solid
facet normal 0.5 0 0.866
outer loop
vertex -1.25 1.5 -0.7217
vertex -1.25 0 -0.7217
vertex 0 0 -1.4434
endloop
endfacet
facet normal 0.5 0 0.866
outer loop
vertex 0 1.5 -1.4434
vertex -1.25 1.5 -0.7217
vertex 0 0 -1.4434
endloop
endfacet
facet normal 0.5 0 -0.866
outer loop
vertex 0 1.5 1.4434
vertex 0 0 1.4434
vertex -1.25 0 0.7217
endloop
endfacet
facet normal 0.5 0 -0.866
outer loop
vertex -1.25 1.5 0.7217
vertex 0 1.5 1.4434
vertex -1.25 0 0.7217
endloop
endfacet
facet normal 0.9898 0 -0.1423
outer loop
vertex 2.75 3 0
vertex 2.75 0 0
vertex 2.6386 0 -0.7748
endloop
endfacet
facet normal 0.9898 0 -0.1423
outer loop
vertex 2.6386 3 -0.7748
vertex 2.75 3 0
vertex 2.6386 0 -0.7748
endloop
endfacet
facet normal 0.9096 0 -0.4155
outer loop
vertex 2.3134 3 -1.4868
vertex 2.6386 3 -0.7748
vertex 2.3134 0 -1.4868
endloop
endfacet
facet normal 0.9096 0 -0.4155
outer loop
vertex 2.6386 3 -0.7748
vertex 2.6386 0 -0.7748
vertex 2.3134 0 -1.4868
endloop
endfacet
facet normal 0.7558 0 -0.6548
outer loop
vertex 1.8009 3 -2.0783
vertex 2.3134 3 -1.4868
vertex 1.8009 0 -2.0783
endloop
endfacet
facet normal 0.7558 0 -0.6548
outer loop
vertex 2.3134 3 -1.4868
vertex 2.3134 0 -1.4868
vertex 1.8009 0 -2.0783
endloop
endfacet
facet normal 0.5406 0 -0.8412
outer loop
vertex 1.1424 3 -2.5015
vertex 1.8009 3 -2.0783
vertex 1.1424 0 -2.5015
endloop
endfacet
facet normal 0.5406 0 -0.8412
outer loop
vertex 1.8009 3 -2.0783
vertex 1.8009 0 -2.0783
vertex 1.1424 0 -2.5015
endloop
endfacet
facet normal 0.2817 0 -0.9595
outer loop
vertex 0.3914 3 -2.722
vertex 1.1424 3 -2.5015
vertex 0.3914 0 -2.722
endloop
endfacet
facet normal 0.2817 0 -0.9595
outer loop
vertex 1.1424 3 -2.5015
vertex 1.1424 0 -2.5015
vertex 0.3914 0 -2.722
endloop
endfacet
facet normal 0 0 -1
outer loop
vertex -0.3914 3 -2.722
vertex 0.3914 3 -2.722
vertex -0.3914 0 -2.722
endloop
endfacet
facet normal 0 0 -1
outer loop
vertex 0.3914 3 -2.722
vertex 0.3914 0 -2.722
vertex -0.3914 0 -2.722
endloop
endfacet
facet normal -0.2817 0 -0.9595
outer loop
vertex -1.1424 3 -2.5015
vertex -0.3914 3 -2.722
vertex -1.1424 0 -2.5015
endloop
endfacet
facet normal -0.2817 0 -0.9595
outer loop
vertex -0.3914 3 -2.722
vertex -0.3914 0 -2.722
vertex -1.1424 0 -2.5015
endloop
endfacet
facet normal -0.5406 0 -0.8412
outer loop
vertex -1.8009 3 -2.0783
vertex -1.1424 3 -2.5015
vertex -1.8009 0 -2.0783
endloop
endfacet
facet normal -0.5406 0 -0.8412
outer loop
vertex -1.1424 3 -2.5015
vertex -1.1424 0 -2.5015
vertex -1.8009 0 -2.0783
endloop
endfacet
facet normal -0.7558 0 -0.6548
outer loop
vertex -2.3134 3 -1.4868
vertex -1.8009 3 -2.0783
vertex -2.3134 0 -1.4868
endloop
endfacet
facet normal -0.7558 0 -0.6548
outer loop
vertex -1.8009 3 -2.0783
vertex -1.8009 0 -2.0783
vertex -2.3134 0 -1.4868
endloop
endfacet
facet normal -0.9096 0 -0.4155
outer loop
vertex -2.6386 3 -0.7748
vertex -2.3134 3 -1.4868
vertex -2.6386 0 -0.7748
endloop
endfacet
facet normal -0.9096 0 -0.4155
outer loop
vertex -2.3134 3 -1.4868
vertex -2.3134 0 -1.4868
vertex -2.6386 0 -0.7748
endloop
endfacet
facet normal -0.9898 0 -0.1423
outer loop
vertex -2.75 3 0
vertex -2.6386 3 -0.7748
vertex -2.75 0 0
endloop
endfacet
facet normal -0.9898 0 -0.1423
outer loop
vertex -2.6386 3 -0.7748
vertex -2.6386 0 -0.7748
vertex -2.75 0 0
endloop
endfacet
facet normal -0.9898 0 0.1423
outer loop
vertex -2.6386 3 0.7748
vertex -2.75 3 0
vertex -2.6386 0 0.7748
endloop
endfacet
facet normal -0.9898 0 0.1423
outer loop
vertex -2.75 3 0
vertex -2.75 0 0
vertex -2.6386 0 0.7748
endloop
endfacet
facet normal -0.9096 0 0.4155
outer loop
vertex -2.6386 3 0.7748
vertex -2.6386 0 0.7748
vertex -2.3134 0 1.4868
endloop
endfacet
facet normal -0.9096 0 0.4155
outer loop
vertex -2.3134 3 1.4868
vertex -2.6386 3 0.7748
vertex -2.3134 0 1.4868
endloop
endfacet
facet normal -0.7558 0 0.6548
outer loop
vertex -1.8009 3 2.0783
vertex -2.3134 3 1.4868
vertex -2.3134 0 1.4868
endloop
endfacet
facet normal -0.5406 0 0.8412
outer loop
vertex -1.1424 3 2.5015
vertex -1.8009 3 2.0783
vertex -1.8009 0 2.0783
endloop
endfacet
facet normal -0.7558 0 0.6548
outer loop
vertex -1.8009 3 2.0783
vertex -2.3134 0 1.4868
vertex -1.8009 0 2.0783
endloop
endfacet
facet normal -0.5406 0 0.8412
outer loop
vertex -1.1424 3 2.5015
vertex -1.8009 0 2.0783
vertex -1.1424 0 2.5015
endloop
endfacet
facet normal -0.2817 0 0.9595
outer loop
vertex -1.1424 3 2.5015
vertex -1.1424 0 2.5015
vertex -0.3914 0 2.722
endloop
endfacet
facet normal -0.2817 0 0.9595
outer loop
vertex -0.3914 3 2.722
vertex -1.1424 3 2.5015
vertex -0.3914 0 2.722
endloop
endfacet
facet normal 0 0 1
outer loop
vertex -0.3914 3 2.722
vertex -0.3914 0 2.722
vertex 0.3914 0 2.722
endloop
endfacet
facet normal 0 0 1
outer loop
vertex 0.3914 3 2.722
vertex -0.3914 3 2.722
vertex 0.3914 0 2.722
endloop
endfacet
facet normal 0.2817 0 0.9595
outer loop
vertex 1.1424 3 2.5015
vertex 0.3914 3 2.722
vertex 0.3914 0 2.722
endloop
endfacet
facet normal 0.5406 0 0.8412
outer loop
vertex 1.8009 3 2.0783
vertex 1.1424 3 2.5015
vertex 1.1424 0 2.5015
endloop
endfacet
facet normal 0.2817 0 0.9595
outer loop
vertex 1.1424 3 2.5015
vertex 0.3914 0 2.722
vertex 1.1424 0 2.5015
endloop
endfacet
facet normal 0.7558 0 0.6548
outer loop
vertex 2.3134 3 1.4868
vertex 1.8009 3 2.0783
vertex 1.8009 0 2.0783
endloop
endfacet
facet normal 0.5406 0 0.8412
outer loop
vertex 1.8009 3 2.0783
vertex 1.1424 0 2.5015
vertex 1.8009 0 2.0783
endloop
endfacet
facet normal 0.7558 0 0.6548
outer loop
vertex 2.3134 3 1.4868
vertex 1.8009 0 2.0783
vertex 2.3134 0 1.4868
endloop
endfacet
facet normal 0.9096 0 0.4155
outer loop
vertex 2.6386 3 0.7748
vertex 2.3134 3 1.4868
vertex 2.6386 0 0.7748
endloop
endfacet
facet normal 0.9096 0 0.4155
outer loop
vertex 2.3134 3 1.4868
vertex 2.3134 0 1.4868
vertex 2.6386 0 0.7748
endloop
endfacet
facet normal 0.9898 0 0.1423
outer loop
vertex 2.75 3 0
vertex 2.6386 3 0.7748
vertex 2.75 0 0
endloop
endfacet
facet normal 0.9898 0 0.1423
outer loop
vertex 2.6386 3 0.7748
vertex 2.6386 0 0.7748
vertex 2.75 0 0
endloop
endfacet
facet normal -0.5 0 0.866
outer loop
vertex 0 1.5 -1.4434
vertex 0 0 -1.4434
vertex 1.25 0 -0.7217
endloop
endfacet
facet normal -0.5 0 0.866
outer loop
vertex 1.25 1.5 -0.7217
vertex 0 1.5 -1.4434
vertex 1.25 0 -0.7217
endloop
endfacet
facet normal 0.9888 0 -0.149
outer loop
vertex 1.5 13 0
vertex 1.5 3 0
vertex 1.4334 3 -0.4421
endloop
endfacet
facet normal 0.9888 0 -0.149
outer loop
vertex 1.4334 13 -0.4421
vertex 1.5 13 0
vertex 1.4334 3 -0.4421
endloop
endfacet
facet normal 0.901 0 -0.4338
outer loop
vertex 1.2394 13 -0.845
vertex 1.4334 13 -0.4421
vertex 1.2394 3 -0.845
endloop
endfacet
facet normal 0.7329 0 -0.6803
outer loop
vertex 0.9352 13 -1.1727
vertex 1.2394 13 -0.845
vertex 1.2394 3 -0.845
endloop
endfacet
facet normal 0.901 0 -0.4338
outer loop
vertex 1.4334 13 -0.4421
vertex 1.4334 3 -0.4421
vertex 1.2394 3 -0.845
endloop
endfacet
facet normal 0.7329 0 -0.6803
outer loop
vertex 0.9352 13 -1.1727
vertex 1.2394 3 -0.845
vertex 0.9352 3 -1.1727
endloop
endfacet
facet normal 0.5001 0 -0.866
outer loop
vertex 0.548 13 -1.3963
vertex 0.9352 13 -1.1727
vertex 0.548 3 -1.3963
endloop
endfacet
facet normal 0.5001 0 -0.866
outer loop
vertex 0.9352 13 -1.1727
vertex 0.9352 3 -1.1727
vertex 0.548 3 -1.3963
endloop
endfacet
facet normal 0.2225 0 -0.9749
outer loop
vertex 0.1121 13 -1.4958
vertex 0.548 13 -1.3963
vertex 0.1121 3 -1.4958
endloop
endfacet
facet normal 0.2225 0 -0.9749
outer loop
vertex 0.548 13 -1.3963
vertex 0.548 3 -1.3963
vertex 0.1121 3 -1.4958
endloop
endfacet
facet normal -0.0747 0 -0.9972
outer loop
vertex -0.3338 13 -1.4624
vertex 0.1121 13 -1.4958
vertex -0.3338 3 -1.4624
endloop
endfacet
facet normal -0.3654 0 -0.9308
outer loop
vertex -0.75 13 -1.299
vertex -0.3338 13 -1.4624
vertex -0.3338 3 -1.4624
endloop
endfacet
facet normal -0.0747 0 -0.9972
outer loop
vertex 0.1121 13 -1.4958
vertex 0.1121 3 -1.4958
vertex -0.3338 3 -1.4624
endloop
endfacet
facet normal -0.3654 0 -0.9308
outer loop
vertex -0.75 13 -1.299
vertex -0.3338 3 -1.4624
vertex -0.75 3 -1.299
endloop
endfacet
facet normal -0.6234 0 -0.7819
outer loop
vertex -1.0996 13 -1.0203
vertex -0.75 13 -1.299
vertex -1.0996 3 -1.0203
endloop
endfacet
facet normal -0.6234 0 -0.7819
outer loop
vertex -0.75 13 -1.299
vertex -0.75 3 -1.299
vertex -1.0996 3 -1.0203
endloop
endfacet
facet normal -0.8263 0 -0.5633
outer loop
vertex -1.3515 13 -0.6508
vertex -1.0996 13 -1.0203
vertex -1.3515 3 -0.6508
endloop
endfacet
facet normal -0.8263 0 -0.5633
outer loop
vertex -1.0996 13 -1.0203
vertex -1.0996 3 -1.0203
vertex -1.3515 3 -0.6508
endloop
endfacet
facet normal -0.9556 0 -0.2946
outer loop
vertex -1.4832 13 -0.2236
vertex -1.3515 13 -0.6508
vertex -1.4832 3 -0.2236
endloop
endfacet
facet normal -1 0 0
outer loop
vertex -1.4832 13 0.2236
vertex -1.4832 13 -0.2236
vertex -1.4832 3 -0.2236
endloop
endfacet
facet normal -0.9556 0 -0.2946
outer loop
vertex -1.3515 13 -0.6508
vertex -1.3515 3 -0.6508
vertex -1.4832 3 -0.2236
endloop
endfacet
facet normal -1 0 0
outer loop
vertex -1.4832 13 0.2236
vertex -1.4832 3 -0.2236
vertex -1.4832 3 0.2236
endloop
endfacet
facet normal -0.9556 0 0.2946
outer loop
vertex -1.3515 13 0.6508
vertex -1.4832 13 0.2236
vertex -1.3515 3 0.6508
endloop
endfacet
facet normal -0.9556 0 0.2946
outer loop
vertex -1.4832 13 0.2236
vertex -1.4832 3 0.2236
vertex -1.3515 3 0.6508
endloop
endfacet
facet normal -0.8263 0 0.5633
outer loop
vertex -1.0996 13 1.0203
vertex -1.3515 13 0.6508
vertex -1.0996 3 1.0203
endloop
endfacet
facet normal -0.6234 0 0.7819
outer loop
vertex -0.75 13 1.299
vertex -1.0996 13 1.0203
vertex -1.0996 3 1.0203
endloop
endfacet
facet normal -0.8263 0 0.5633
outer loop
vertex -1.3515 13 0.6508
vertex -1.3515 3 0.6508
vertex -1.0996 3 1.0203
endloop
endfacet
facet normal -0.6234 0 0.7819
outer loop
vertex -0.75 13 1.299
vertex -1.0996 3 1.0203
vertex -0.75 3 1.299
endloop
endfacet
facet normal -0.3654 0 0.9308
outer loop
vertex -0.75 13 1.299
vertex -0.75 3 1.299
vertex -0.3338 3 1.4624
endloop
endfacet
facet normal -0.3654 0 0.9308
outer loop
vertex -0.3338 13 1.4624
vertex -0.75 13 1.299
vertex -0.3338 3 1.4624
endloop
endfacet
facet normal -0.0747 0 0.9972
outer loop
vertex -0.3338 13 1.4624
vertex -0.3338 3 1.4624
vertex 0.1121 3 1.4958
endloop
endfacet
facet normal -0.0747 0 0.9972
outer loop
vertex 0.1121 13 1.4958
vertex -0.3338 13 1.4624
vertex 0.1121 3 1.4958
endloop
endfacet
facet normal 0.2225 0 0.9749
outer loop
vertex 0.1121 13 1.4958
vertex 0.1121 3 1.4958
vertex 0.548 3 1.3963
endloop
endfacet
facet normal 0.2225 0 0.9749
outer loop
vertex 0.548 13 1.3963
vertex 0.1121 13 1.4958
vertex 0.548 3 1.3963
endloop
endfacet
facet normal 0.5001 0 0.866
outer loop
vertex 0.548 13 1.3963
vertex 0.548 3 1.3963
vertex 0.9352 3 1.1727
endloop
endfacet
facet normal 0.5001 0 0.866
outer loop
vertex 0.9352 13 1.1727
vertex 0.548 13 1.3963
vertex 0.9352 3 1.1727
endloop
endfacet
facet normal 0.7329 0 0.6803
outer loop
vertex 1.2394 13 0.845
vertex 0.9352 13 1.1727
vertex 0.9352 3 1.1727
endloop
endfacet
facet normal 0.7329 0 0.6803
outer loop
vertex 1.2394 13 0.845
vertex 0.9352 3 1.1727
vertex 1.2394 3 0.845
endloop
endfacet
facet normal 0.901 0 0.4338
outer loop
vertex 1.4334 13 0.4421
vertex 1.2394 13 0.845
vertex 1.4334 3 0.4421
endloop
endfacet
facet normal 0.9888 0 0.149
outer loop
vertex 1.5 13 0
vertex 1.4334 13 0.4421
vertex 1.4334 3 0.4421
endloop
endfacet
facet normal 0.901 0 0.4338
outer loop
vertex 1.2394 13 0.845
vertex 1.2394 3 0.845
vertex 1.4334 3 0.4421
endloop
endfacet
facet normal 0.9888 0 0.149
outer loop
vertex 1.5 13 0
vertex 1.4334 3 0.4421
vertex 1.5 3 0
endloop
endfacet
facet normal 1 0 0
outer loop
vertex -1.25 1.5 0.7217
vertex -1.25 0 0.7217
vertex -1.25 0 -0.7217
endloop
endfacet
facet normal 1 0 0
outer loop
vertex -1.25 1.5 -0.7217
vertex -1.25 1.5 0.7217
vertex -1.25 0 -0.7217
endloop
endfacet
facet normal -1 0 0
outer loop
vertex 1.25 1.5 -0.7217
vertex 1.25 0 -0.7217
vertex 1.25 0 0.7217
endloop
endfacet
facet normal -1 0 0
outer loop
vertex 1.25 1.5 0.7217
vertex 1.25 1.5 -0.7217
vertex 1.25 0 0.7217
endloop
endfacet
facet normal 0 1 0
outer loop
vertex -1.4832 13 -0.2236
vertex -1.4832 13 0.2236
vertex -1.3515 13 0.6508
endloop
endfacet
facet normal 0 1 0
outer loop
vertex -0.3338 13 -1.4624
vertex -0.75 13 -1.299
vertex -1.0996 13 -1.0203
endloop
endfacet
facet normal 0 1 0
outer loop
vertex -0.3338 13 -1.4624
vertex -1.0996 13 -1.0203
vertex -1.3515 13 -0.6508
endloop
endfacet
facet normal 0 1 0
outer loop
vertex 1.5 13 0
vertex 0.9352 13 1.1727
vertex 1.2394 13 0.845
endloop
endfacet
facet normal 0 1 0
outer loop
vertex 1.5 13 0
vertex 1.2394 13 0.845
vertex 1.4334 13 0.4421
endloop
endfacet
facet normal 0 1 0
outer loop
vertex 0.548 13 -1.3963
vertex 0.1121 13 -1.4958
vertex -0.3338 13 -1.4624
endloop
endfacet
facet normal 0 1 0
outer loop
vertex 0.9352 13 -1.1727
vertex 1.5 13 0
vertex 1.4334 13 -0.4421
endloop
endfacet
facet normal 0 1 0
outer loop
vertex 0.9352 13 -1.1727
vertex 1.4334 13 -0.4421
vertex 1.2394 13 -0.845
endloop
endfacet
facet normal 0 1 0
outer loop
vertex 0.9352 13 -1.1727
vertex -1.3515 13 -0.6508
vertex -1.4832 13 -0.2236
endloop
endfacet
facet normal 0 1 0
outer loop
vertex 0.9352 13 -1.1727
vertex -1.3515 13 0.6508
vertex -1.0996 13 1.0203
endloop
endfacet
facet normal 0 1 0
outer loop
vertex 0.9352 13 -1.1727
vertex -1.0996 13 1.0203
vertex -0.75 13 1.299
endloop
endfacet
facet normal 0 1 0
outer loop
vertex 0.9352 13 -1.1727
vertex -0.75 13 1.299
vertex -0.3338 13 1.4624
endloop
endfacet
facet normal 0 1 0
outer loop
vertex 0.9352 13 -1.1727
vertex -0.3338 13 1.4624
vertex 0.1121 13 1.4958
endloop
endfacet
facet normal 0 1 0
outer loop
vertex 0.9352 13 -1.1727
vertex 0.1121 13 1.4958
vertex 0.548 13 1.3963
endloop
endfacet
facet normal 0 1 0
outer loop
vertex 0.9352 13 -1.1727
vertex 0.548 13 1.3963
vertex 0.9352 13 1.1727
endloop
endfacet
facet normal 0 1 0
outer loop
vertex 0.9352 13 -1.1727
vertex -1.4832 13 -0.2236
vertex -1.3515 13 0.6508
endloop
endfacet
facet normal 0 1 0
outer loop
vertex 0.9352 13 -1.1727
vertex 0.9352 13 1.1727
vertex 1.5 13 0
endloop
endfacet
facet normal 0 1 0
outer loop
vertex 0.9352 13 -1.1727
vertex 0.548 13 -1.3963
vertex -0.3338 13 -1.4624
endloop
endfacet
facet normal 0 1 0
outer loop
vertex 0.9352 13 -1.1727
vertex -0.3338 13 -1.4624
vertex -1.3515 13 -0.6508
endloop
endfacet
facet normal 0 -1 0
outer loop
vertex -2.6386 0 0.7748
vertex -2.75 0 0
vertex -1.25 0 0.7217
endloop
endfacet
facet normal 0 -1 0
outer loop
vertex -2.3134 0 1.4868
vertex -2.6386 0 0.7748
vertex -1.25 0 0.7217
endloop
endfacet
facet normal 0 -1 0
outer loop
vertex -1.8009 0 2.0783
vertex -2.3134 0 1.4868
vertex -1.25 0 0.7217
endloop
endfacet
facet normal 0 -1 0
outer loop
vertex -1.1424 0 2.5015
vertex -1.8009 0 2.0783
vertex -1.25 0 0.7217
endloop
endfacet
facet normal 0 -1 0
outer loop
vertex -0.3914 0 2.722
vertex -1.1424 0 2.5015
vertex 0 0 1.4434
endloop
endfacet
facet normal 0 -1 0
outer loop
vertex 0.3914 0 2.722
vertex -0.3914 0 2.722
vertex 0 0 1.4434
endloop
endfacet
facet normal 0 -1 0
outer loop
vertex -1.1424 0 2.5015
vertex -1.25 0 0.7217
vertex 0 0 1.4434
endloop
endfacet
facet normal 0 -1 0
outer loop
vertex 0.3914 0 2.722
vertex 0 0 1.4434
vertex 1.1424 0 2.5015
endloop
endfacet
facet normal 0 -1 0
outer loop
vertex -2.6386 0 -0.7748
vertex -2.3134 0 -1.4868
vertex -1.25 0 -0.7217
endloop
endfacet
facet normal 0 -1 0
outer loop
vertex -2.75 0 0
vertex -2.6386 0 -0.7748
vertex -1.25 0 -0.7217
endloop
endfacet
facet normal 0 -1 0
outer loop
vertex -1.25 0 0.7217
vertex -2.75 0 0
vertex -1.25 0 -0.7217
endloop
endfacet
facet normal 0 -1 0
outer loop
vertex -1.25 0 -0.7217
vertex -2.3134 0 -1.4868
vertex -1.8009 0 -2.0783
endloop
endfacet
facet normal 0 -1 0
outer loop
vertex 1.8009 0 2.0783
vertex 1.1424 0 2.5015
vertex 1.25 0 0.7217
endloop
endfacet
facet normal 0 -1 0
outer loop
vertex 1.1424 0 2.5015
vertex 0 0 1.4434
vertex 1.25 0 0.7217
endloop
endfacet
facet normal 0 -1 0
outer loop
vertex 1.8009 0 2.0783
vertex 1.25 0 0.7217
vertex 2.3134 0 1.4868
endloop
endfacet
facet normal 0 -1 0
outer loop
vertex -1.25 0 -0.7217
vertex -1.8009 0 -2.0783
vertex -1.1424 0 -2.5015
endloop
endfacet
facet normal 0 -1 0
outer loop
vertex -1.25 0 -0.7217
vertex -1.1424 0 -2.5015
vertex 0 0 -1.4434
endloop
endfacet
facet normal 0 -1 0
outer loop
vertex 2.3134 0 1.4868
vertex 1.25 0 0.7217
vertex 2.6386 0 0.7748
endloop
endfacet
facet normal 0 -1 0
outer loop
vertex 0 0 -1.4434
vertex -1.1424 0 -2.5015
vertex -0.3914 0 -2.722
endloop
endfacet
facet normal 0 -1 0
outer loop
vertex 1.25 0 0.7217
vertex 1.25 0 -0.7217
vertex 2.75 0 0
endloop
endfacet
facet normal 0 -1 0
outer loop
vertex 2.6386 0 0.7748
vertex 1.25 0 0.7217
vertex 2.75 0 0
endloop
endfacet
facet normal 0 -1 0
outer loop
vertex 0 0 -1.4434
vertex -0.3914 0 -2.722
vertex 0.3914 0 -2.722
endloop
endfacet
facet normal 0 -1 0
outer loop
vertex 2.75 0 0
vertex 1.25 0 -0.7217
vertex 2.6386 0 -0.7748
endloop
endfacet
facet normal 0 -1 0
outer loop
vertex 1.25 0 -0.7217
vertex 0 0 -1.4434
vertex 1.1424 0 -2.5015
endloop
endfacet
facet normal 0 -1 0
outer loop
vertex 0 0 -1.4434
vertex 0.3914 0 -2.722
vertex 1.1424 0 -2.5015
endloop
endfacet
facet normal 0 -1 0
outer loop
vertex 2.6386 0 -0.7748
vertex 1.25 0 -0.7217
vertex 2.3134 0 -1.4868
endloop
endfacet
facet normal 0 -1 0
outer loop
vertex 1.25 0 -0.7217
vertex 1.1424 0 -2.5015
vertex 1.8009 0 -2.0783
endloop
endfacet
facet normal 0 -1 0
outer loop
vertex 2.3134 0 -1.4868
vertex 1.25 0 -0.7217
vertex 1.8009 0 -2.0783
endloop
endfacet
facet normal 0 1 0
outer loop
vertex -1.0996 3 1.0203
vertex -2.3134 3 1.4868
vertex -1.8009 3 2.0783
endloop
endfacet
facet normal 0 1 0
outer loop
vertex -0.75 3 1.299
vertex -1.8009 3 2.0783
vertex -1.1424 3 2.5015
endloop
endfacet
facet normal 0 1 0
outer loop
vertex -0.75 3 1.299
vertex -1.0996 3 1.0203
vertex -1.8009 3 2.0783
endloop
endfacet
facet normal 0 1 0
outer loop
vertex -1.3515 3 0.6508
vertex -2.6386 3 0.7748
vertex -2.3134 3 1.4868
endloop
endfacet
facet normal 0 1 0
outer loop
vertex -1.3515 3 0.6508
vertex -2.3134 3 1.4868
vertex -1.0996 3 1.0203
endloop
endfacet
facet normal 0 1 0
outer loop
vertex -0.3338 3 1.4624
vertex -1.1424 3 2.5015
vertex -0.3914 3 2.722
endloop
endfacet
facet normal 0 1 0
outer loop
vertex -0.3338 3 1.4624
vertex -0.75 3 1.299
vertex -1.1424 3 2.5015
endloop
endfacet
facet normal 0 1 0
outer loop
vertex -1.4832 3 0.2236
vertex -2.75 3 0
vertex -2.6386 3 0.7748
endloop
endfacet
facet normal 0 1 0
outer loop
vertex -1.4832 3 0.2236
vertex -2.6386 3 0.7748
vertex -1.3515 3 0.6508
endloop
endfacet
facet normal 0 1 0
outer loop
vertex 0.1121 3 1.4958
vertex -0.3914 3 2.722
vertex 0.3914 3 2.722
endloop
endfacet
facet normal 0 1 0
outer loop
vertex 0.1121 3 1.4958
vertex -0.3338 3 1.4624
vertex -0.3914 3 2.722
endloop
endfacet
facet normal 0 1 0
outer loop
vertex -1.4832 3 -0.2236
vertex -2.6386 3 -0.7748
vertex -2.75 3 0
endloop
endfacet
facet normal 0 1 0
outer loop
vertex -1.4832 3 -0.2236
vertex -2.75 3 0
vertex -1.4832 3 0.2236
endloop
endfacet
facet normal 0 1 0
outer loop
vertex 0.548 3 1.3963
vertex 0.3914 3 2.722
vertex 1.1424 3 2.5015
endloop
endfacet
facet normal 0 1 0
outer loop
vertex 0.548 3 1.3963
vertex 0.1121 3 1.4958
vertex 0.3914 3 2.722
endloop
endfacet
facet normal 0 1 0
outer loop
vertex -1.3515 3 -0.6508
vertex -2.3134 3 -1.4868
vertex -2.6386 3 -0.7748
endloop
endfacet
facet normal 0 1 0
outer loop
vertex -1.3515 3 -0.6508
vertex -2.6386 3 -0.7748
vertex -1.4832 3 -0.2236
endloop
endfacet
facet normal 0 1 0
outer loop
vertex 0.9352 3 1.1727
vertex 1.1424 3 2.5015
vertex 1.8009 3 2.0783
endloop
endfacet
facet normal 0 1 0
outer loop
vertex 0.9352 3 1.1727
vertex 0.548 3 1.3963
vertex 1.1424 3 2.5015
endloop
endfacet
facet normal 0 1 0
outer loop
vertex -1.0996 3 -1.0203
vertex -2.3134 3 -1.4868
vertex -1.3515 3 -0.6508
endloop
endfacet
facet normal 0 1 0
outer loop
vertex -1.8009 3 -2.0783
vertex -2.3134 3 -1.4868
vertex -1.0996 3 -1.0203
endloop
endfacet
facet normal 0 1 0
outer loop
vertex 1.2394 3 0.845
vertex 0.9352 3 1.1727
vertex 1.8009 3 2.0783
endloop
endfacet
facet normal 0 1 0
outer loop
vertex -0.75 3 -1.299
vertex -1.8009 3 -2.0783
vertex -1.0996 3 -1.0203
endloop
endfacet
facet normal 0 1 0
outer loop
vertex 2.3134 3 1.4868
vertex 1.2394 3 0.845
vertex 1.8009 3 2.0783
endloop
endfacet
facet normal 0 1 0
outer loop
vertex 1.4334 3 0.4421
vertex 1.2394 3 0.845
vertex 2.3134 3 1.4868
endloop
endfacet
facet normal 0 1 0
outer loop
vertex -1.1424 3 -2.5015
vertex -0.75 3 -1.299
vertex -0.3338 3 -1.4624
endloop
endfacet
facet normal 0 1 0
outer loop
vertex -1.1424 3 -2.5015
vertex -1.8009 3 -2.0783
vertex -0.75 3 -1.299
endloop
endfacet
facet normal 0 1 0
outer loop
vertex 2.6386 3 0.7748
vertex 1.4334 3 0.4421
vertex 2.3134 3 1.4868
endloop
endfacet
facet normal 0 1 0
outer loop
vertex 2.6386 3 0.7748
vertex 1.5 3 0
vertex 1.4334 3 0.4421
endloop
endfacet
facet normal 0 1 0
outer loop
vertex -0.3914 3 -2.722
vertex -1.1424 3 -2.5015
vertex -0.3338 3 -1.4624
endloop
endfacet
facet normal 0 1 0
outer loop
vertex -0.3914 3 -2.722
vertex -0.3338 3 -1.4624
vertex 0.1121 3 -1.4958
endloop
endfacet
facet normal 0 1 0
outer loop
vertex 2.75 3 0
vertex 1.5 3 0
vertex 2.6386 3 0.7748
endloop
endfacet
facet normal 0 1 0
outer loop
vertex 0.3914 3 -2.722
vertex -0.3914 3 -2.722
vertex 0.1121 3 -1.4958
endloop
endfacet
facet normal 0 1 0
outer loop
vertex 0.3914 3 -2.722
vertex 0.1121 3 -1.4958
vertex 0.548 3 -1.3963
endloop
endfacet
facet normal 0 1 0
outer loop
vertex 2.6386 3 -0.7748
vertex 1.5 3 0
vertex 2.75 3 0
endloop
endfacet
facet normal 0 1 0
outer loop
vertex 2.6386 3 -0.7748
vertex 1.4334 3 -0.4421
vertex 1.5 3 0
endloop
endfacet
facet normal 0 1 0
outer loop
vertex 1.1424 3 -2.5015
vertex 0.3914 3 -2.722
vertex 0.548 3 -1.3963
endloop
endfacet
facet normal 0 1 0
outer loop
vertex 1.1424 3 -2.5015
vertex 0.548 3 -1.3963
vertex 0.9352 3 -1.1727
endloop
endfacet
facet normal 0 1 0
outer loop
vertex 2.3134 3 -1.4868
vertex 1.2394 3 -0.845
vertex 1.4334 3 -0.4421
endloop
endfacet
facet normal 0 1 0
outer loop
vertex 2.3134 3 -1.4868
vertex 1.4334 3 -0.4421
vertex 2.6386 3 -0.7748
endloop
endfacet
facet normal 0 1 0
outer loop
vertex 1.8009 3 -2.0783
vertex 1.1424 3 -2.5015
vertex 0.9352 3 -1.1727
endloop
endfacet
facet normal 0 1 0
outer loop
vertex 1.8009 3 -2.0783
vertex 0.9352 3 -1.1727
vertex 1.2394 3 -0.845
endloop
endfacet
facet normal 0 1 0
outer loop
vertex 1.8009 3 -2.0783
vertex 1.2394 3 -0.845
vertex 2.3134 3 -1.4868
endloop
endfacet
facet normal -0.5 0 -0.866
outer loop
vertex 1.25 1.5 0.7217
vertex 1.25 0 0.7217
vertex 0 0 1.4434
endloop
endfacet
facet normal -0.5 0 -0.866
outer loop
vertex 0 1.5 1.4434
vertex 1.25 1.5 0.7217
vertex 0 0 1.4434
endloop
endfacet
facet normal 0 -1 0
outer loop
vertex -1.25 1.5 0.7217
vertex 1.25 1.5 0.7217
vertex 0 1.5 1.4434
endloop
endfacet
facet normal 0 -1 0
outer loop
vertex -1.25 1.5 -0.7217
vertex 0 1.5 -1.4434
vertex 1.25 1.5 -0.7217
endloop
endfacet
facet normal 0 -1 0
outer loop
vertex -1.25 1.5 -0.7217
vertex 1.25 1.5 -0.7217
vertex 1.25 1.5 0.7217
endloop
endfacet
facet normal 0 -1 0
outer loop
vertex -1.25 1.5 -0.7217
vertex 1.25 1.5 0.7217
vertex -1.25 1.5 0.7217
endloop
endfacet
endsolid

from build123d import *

# Parameters (mm, degrees)
SKETCH1_R           = 2.75
BOSS_EXTRUDE1_DEPTH = 3
SKETCH2_R           = 1.5
BOSS_EXTRUDE2_DEPTH = 10
CUT_EXTRUDE1_DEPTH  = 1.5


with BuildPart() as part:
    # Sketch1 → Boss-Extrude1 (new body)
    with BuildSketch(Plane(origin=(0, 0, 0), x_dir=(1, 0, 0), z_dir=(0, 1, 0))):
        Circle(SKETCH1_R)
    extrude(amount=BOSS_EXTRUDE1_DEPTH)

    # Sketch2 → Boss-Extrude2 (add)
    with BuildSketch(Plane(origin=(0, 3, 0), x_dir=(1, 0, 0), z_dir=(0, 1, 0))):
        Circle(SKETCH2_R)
    extrude(amount=BOSS_EXTRUDE2_DEPTH)

    # Sketch3 → Cut-Extrude1 (cut)
    with BuildSketch(Plane(origin=(0, 0, 0), x_dir=(-1, 0, 0), z_dir=(0, -1, 0))):
        Polygon((0, -1.443375673), (1.25, -0.721687836), (1.25, 0.721687836), (0, 1.443375673), (-1.25, 0.721687836), (-1.25, -0.721687836), align=None)
    extrude(amount=-CUT_EXTRUDE1_DEPTH, mode=Mode.SUBTRACT)


solid = part.part
